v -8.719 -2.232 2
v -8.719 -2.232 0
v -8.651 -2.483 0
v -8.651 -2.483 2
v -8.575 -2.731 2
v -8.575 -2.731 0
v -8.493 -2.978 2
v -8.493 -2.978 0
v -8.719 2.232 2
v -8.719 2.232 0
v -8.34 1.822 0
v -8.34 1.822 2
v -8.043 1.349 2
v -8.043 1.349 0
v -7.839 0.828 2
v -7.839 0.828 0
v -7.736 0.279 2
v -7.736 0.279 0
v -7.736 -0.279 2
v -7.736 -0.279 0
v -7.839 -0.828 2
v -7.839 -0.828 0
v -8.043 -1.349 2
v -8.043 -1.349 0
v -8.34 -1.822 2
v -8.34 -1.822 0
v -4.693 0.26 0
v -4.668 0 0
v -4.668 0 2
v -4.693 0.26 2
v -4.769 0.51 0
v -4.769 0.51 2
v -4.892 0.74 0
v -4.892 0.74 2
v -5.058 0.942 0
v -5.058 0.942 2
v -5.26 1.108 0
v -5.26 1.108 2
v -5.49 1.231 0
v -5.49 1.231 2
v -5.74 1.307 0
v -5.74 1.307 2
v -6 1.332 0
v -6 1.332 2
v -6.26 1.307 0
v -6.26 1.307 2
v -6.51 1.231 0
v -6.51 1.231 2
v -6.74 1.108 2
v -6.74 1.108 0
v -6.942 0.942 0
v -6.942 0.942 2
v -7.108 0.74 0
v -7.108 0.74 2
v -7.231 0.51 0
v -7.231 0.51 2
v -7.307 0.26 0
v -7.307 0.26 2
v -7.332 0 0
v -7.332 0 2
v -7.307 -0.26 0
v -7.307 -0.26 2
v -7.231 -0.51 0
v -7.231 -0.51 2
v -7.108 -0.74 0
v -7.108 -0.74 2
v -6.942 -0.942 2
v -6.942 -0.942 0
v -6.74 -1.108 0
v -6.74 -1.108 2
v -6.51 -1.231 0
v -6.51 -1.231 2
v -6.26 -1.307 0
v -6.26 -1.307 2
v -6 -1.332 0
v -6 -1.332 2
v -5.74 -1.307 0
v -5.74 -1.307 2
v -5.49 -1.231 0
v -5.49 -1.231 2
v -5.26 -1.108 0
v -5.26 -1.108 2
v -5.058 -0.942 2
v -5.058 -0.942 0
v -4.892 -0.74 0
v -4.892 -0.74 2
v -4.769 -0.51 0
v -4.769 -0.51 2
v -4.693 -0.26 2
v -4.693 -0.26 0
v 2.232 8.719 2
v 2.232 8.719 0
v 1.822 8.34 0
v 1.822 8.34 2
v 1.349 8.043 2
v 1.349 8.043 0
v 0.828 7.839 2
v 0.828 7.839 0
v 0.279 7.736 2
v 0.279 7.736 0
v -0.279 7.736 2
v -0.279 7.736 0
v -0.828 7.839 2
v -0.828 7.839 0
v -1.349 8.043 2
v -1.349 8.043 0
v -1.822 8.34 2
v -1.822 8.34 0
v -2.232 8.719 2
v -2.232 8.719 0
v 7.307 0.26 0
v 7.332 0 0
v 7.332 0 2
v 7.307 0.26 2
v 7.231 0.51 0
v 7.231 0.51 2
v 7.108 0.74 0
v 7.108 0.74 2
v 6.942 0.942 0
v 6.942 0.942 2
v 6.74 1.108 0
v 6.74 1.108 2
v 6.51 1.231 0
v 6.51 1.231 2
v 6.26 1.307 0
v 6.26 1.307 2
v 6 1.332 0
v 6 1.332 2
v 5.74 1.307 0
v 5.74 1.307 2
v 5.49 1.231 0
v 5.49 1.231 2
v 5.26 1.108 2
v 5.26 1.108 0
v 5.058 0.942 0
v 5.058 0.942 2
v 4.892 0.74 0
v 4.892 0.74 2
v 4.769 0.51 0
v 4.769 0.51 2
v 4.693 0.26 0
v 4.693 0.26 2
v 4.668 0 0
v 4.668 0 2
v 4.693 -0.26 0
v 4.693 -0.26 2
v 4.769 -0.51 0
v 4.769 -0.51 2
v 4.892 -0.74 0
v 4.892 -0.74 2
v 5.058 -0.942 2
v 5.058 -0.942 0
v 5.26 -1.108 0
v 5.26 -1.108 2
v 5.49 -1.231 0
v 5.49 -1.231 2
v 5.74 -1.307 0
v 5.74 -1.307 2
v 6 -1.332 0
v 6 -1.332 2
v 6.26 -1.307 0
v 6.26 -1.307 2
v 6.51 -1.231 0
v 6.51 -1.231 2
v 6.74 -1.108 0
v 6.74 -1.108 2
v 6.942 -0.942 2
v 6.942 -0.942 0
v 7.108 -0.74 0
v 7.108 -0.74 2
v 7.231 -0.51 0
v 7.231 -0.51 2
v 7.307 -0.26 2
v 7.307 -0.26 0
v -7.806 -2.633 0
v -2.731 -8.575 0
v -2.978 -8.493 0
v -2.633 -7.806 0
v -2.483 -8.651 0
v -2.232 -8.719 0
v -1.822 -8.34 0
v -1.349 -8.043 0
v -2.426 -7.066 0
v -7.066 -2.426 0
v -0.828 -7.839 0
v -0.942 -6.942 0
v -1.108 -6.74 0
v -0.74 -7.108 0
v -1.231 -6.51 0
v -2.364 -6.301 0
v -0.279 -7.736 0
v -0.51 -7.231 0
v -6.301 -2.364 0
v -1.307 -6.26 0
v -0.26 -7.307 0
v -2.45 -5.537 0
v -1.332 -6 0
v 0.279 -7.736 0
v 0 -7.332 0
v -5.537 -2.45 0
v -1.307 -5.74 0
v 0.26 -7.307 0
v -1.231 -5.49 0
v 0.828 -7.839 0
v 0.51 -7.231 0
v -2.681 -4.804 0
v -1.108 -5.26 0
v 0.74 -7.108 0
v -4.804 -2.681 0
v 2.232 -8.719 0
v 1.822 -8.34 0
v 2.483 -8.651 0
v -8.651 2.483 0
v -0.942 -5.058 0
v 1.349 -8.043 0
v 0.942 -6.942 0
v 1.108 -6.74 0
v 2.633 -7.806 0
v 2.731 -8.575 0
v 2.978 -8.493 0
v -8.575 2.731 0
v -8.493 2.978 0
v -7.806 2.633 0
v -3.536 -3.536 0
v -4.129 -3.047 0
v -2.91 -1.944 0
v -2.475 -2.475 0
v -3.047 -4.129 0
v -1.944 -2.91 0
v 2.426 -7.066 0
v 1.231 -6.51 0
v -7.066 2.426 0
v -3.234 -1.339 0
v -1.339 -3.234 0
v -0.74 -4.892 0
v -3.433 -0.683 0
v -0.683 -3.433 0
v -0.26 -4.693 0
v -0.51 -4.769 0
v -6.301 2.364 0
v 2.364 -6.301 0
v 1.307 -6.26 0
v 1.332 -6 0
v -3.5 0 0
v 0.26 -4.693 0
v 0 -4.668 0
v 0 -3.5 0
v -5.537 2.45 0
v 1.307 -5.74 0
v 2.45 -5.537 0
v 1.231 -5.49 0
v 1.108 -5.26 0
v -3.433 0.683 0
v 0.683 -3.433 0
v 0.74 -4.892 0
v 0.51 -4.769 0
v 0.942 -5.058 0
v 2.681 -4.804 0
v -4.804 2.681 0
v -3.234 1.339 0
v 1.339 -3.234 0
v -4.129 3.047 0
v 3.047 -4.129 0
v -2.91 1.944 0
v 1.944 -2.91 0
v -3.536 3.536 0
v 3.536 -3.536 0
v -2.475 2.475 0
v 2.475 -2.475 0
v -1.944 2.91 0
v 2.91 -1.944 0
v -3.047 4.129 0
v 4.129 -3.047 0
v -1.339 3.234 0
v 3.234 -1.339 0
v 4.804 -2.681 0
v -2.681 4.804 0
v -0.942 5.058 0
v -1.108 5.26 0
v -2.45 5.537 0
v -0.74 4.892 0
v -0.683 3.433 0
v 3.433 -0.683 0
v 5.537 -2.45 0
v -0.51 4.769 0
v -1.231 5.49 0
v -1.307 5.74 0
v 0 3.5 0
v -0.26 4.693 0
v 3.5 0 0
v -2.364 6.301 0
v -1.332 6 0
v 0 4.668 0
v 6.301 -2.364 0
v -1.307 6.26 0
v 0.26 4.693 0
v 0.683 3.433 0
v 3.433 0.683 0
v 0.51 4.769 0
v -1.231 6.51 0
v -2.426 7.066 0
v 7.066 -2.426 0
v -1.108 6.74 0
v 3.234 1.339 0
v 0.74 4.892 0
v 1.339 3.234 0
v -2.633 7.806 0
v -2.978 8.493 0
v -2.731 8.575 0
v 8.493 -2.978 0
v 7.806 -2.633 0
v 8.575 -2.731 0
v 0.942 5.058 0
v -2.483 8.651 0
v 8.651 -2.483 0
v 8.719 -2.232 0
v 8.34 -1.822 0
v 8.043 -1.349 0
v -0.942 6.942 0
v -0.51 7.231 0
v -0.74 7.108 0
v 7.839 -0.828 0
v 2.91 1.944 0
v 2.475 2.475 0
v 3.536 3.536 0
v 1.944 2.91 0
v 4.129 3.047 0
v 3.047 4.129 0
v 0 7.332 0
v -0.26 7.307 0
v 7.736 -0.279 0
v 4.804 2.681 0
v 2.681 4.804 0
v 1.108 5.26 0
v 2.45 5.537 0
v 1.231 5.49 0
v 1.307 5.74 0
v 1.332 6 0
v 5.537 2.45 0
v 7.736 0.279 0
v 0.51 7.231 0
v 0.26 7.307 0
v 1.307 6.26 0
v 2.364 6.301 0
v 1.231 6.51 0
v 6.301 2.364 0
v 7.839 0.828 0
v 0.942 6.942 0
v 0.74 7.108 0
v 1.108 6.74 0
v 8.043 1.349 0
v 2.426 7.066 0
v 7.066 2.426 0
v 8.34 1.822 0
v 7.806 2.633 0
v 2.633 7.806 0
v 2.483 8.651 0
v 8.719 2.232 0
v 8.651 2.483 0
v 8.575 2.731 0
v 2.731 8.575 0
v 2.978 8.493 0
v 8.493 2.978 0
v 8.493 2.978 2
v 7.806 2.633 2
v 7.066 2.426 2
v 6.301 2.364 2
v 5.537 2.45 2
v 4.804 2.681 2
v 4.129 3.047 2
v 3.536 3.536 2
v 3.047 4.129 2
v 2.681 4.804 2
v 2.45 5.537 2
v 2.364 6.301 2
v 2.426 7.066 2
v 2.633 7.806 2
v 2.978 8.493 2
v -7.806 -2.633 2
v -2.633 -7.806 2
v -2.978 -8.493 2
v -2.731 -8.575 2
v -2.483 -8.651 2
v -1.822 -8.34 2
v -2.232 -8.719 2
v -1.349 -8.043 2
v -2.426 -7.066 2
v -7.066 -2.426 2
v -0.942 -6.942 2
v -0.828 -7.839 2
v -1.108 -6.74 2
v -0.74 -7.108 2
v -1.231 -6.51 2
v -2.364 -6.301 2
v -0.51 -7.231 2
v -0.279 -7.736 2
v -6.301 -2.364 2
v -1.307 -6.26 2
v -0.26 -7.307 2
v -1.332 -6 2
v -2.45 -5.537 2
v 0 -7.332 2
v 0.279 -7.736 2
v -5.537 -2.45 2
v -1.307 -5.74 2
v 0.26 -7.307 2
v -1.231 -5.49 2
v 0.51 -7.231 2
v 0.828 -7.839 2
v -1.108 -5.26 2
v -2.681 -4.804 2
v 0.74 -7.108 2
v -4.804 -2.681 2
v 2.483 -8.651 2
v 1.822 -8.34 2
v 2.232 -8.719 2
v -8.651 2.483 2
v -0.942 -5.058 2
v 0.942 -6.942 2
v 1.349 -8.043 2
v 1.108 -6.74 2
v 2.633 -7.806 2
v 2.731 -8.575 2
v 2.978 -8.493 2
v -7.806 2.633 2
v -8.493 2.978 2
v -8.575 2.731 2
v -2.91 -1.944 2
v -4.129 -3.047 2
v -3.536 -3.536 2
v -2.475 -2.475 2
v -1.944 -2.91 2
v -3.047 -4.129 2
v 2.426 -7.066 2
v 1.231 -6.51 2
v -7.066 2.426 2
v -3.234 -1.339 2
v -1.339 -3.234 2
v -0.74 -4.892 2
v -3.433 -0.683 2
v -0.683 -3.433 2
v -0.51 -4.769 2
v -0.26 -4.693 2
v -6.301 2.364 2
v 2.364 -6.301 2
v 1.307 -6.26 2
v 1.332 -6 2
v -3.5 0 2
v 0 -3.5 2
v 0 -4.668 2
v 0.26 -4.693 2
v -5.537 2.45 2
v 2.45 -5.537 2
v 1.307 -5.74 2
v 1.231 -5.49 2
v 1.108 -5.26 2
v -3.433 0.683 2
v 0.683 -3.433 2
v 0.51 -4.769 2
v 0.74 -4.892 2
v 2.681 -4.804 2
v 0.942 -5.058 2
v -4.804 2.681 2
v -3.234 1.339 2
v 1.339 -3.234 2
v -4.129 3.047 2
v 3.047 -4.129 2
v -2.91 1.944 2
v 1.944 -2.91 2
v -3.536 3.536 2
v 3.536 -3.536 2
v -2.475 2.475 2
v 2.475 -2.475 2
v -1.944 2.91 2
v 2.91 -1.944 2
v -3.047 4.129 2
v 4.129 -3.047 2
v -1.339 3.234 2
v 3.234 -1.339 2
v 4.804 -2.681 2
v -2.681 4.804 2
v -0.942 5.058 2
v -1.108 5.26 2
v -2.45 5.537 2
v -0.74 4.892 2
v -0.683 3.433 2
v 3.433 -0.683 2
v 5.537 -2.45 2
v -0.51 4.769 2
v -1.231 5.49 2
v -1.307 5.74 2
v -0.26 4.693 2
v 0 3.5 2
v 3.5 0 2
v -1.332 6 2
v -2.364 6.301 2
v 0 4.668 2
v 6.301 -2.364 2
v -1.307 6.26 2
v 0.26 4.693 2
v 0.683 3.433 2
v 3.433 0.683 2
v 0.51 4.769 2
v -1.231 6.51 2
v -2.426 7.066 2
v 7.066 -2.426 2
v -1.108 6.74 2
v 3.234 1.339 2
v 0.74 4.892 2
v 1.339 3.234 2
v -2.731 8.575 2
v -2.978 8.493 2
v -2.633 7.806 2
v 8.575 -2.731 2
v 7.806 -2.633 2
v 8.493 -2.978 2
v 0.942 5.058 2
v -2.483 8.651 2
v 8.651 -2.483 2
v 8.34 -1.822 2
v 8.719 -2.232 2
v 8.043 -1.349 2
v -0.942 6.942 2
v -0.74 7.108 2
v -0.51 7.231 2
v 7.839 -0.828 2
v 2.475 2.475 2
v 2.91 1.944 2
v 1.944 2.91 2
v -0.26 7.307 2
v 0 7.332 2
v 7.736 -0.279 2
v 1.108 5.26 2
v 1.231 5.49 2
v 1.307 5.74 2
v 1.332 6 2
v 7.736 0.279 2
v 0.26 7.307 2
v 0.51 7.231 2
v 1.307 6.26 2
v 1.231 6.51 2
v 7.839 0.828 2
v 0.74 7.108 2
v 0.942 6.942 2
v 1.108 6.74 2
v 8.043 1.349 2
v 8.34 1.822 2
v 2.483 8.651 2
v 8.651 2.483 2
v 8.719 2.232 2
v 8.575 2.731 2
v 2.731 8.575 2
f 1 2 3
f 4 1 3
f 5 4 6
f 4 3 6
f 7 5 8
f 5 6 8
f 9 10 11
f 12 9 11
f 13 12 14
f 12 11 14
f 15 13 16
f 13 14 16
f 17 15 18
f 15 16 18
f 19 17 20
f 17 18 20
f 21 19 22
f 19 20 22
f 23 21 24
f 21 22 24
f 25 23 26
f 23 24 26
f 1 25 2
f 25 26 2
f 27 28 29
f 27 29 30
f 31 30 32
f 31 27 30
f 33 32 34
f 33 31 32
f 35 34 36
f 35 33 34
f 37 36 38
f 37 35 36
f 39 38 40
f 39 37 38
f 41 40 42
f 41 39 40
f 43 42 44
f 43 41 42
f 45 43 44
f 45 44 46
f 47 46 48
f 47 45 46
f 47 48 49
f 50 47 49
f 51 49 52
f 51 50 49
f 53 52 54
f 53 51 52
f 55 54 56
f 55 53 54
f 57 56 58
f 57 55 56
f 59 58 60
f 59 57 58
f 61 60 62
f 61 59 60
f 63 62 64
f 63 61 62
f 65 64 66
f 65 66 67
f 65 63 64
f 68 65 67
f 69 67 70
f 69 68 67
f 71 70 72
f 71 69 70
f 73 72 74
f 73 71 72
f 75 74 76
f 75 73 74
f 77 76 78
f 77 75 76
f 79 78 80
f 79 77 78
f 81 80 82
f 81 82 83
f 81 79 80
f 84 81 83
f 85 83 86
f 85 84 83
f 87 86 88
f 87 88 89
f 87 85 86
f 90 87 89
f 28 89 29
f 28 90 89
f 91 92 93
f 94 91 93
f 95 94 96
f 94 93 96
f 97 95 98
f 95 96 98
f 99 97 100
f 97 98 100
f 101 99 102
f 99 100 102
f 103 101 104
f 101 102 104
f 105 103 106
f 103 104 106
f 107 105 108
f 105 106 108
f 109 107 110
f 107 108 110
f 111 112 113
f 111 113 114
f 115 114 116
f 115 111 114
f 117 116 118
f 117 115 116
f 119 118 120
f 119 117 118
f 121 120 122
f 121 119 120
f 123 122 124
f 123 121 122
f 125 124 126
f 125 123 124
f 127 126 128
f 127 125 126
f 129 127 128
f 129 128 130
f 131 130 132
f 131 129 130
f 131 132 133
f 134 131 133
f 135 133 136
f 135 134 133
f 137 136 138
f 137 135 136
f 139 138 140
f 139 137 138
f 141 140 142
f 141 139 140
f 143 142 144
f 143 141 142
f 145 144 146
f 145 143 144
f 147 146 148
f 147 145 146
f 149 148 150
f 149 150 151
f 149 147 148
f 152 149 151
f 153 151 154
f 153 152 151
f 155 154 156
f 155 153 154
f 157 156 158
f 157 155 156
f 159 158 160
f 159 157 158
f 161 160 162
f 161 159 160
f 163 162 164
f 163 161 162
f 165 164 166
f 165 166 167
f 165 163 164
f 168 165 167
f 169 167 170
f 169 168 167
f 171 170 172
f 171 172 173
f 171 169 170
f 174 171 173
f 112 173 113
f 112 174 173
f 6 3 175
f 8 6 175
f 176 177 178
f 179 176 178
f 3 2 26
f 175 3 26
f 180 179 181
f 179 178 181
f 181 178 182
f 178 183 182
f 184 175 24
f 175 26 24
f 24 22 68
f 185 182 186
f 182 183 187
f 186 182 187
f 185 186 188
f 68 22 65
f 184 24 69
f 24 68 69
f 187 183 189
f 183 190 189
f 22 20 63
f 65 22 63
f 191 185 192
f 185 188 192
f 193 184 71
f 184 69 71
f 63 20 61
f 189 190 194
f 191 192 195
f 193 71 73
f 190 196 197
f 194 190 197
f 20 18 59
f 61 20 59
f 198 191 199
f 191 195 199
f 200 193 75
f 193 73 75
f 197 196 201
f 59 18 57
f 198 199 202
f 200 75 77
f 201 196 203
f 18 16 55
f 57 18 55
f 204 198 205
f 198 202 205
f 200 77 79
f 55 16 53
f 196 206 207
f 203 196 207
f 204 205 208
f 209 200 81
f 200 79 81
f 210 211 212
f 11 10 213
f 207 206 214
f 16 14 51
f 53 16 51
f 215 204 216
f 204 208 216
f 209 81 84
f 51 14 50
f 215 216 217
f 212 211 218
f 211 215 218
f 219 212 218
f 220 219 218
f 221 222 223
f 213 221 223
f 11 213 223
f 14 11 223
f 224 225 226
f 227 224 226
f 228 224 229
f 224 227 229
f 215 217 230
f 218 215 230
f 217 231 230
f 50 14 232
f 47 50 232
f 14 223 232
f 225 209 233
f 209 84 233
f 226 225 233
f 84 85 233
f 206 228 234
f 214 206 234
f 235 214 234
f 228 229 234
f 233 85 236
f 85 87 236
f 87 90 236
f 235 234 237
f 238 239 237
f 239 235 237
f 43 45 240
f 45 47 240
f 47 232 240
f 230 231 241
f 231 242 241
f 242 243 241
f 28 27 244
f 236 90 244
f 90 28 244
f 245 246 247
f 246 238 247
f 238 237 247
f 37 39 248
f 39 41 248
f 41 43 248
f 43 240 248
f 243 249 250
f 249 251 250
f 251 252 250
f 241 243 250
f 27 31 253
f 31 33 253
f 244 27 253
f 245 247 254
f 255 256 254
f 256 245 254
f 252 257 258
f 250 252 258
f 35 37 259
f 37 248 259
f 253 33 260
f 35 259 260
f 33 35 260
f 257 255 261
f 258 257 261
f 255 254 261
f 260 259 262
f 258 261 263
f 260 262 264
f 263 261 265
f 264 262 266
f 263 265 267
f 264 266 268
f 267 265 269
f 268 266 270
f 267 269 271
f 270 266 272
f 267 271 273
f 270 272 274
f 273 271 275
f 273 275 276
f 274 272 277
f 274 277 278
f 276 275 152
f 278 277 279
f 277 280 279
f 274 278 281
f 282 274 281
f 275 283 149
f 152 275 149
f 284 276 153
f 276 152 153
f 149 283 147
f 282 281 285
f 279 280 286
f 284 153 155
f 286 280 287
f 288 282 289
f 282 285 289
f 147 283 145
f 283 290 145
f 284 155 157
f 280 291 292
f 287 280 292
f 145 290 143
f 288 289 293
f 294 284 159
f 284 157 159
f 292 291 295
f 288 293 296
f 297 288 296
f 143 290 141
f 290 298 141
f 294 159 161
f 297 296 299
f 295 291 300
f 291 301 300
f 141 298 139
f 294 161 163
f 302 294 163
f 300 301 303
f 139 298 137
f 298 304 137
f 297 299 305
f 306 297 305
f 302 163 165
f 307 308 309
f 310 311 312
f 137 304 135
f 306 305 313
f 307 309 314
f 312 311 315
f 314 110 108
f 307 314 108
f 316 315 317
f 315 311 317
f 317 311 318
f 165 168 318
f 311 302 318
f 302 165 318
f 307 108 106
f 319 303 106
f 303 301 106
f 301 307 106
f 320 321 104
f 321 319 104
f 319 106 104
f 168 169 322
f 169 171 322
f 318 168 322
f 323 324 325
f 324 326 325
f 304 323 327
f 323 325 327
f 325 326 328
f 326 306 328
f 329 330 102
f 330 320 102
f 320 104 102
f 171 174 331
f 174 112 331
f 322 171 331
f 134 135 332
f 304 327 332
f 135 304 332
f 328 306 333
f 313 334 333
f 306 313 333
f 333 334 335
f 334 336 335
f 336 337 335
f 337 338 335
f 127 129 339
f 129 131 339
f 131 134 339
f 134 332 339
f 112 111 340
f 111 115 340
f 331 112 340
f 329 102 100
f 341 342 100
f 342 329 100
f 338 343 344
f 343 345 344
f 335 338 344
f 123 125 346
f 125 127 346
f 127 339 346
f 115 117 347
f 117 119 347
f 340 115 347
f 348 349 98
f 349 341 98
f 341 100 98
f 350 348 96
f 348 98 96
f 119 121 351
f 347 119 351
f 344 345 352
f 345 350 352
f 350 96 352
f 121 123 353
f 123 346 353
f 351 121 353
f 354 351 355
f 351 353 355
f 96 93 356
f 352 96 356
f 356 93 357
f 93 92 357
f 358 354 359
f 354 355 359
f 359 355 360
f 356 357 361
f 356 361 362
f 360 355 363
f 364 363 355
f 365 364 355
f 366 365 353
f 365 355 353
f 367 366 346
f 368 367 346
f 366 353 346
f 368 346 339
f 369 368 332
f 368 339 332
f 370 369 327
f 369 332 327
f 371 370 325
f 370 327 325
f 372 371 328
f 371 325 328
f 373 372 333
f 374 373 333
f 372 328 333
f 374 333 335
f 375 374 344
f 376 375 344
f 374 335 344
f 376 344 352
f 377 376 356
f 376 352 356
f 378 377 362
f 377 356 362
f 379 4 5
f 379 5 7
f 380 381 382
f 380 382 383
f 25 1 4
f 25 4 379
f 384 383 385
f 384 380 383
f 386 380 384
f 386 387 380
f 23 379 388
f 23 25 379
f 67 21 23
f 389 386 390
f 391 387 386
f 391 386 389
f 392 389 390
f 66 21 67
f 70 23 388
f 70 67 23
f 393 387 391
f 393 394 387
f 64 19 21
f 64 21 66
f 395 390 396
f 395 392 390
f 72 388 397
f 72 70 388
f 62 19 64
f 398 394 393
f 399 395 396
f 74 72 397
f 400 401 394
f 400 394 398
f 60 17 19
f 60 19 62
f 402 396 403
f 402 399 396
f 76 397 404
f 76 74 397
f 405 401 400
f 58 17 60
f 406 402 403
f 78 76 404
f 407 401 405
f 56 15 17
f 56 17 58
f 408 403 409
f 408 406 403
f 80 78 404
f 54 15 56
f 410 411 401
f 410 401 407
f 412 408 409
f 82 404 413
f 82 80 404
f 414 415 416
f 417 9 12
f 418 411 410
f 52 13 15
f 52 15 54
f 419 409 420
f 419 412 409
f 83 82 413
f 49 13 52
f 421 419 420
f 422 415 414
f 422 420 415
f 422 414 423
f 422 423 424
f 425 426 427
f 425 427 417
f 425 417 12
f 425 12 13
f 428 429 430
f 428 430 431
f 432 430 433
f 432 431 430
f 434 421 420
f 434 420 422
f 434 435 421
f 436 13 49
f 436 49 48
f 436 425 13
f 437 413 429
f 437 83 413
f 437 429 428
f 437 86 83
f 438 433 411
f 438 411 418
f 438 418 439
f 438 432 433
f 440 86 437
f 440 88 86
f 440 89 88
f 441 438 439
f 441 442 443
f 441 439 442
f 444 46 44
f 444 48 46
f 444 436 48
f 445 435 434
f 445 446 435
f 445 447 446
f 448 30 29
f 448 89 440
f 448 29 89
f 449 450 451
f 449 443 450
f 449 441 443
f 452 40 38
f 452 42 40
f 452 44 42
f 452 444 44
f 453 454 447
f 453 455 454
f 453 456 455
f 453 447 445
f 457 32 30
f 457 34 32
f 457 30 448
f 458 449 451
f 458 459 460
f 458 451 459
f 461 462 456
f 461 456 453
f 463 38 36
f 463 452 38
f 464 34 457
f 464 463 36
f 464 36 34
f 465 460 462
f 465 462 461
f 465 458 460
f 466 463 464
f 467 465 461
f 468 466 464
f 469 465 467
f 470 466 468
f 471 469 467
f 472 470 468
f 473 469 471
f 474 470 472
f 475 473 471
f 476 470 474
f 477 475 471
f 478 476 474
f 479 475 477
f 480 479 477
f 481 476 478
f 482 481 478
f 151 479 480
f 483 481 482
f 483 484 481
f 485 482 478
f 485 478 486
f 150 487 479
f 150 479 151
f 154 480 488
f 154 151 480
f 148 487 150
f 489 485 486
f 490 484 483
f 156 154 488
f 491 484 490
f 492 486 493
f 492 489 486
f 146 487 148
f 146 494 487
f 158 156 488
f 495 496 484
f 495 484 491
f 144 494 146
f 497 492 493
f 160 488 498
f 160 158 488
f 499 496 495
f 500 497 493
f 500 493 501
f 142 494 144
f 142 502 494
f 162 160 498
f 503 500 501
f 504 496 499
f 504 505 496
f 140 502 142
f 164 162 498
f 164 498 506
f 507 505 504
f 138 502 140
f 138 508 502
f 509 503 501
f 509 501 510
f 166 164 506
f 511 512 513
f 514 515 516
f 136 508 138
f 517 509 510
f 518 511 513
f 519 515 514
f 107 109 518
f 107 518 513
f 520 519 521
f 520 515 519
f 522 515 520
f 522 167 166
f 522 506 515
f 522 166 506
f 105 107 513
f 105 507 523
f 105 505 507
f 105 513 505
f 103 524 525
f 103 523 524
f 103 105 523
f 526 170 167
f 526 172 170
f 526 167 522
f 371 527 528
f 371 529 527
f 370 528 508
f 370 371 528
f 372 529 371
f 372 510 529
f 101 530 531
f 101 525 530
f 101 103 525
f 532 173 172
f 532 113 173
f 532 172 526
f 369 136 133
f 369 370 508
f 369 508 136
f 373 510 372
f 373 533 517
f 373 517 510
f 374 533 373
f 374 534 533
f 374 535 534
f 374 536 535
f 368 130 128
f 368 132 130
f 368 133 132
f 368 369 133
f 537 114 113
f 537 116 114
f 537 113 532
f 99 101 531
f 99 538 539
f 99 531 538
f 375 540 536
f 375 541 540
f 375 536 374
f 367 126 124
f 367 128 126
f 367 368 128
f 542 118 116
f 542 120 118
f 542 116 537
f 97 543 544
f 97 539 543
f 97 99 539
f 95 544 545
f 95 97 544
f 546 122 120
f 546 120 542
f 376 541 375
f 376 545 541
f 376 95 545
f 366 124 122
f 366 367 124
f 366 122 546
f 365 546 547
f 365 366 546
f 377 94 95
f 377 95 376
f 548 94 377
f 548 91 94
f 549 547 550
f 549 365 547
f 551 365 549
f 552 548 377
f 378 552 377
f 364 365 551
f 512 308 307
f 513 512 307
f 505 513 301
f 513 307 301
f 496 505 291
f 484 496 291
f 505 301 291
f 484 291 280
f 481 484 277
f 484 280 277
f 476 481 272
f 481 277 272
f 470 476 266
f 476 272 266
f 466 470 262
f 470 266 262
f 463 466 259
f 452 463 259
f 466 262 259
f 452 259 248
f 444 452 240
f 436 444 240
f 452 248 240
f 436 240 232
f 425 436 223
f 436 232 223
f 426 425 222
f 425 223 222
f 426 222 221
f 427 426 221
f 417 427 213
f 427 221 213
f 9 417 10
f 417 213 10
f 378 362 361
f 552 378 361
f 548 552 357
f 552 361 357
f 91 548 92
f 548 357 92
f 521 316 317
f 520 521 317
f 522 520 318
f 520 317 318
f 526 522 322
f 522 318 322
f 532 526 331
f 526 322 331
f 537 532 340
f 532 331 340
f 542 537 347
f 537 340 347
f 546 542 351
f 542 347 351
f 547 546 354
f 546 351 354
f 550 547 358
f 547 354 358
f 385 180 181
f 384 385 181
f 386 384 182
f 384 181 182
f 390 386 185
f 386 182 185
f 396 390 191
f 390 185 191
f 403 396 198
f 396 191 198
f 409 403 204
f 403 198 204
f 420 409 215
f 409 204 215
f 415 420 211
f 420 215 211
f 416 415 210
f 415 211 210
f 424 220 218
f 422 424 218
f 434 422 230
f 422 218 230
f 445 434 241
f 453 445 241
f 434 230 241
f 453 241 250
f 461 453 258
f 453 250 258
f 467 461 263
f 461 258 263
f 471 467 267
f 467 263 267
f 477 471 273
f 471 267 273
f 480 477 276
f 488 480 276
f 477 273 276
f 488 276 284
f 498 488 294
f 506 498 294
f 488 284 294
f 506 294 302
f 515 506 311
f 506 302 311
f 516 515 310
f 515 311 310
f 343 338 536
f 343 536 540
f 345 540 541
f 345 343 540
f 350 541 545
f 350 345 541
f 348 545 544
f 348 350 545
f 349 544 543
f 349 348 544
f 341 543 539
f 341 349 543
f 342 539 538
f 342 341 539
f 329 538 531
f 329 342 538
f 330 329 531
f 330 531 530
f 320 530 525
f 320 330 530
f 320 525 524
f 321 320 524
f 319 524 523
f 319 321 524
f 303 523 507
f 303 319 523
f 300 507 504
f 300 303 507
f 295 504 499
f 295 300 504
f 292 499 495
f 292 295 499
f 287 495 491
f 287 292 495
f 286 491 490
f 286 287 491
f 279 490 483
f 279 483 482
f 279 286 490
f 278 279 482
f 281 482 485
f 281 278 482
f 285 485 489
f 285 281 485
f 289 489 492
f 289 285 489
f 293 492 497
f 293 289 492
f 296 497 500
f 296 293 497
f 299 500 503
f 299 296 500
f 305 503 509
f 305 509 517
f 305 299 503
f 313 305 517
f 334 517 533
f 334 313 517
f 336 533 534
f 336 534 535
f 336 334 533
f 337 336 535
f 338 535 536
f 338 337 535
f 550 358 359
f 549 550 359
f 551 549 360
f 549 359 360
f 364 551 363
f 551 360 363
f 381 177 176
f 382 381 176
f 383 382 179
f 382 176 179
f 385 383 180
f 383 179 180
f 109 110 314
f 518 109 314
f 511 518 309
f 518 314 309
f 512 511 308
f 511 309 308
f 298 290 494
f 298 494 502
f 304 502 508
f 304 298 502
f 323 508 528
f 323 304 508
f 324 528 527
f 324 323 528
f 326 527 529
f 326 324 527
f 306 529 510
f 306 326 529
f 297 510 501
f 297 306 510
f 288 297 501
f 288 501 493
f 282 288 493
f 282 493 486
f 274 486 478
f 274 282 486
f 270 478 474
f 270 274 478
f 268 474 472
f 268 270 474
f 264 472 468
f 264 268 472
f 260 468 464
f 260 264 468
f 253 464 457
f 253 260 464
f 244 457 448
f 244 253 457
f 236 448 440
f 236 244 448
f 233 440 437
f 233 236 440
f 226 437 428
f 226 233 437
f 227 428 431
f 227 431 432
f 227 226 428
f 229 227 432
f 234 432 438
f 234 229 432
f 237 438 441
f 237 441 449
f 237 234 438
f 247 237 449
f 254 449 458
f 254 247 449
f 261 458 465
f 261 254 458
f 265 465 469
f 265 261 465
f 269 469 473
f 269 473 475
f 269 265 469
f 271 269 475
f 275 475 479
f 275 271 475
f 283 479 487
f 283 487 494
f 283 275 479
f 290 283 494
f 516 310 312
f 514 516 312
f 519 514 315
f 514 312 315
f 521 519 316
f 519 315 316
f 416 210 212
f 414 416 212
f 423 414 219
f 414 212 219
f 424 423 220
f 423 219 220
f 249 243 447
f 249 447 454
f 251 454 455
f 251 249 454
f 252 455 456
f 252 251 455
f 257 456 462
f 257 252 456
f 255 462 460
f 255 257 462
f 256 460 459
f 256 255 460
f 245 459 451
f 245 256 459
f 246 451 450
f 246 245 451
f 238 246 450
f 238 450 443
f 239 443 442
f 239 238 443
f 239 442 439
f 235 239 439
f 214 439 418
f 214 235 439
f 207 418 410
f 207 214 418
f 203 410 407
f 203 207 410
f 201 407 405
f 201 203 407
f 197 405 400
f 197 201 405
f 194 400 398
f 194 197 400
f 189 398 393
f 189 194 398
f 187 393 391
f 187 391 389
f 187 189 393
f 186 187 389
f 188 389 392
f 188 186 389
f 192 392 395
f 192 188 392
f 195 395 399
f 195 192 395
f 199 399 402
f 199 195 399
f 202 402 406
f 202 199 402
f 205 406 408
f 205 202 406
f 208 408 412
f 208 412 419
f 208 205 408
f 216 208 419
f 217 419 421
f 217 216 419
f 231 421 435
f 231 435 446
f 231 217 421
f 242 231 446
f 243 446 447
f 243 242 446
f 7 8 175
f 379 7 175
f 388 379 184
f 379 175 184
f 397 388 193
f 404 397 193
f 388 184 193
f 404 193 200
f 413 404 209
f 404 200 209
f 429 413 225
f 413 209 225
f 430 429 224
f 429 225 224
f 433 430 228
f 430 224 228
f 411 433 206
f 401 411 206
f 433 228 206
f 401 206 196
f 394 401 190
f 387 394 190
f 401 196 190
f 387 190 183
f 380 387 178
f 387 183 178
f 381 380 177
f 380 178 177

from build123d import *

# Parameters (mm, degrees)
F0_R     = 1.33216
F0_R_2   = 3.5
F1_DEPTH = 2


with BuildPart() as f1:
    # F0 (on Top) → F1 (new body)
    with BuildSketch(Plane.XY):
        with BuildLine():
            ThreePointArc((-8.493127, -2.977716), (-3.535534, -3.535534), (-2.977716, -8.493127))
            ThreePointArc((-2.977716, -8.493127), (-2.607487, -8.614001), (-2.232376, -8.718744))
            ThreePointArc((-2.232376, -8.718744), (0, -7.722864), (2.232376, -8.718744))
            ThreePointArc((2.232376, -8.718744), (2.607487, -8.614001), (2.977716, -8.493127))
            ThreePointArc((2.977716, -8.493127), (3.535534, -3.535534), (8.493127, -2.977716))
            ThreePointArc((8.493127, -2.977716), (8.614001, -2.607487), (8.718744, -2.232376))
            ThreePointArc((8.718744, -2.232376), (7.722864, 0), (8.718744, 2.232376))
            ThreePointArc((8.718744, 2.232376), (8.614001, 2.607487), (8.493127, 2.977716))
            ThreePointArc((8.493127, 2.977716), (3.535534, 3.535534), (2.977716, 8.493127))
            ThreePointArc((2.977716, 8.493127), (2.607487, 8.614001), (2.232376, 8.718744))
            ThreePointArc((2.232376, 8.718744), (0, 7.722864), (-2.232376, 8.718744))
            ThreePointArc((-2.232376, 8.718744), (-2.607487, 8.614001), (-2.977716, 8.493127))
            ThreePointArc((-2.977716, 8.493127), (-3.535534, 3.535534), (-8.493127, 2.977716))
            ThreePointArc((-8.493127, 2.977716), (-8.614001, 2.607487), (-8.718744, 2.232376))
            ThreePointArc((-8.718744, 2.232376), (-7.722864, 0), (-8.718744, -2.232376))
            ThreePointArc((-8.718744, -2.232376), (-8.614001, -2.607487), (-8.493127, -2.977716))
        make_face()
        with Locations((0, -6)):
            Circle(F0_R, mode=Mode.SUBTRACT)
        with Locations((-6, 0)):
            Circle(F0_R, mode=Mode.SUBTRACT)
        Circle(F0_R_2, mode=Mode.SUBTRACT)
        with Locations((0, 6)):
            Circle(F0_R, mode=Mode.SUBTRACT)
        with Locations((6, 0)):
            Circle(F0_R, mode=Mode.SUBTRACT)
    extrude(amount=F1_DEPTH)


solid = f1.part
